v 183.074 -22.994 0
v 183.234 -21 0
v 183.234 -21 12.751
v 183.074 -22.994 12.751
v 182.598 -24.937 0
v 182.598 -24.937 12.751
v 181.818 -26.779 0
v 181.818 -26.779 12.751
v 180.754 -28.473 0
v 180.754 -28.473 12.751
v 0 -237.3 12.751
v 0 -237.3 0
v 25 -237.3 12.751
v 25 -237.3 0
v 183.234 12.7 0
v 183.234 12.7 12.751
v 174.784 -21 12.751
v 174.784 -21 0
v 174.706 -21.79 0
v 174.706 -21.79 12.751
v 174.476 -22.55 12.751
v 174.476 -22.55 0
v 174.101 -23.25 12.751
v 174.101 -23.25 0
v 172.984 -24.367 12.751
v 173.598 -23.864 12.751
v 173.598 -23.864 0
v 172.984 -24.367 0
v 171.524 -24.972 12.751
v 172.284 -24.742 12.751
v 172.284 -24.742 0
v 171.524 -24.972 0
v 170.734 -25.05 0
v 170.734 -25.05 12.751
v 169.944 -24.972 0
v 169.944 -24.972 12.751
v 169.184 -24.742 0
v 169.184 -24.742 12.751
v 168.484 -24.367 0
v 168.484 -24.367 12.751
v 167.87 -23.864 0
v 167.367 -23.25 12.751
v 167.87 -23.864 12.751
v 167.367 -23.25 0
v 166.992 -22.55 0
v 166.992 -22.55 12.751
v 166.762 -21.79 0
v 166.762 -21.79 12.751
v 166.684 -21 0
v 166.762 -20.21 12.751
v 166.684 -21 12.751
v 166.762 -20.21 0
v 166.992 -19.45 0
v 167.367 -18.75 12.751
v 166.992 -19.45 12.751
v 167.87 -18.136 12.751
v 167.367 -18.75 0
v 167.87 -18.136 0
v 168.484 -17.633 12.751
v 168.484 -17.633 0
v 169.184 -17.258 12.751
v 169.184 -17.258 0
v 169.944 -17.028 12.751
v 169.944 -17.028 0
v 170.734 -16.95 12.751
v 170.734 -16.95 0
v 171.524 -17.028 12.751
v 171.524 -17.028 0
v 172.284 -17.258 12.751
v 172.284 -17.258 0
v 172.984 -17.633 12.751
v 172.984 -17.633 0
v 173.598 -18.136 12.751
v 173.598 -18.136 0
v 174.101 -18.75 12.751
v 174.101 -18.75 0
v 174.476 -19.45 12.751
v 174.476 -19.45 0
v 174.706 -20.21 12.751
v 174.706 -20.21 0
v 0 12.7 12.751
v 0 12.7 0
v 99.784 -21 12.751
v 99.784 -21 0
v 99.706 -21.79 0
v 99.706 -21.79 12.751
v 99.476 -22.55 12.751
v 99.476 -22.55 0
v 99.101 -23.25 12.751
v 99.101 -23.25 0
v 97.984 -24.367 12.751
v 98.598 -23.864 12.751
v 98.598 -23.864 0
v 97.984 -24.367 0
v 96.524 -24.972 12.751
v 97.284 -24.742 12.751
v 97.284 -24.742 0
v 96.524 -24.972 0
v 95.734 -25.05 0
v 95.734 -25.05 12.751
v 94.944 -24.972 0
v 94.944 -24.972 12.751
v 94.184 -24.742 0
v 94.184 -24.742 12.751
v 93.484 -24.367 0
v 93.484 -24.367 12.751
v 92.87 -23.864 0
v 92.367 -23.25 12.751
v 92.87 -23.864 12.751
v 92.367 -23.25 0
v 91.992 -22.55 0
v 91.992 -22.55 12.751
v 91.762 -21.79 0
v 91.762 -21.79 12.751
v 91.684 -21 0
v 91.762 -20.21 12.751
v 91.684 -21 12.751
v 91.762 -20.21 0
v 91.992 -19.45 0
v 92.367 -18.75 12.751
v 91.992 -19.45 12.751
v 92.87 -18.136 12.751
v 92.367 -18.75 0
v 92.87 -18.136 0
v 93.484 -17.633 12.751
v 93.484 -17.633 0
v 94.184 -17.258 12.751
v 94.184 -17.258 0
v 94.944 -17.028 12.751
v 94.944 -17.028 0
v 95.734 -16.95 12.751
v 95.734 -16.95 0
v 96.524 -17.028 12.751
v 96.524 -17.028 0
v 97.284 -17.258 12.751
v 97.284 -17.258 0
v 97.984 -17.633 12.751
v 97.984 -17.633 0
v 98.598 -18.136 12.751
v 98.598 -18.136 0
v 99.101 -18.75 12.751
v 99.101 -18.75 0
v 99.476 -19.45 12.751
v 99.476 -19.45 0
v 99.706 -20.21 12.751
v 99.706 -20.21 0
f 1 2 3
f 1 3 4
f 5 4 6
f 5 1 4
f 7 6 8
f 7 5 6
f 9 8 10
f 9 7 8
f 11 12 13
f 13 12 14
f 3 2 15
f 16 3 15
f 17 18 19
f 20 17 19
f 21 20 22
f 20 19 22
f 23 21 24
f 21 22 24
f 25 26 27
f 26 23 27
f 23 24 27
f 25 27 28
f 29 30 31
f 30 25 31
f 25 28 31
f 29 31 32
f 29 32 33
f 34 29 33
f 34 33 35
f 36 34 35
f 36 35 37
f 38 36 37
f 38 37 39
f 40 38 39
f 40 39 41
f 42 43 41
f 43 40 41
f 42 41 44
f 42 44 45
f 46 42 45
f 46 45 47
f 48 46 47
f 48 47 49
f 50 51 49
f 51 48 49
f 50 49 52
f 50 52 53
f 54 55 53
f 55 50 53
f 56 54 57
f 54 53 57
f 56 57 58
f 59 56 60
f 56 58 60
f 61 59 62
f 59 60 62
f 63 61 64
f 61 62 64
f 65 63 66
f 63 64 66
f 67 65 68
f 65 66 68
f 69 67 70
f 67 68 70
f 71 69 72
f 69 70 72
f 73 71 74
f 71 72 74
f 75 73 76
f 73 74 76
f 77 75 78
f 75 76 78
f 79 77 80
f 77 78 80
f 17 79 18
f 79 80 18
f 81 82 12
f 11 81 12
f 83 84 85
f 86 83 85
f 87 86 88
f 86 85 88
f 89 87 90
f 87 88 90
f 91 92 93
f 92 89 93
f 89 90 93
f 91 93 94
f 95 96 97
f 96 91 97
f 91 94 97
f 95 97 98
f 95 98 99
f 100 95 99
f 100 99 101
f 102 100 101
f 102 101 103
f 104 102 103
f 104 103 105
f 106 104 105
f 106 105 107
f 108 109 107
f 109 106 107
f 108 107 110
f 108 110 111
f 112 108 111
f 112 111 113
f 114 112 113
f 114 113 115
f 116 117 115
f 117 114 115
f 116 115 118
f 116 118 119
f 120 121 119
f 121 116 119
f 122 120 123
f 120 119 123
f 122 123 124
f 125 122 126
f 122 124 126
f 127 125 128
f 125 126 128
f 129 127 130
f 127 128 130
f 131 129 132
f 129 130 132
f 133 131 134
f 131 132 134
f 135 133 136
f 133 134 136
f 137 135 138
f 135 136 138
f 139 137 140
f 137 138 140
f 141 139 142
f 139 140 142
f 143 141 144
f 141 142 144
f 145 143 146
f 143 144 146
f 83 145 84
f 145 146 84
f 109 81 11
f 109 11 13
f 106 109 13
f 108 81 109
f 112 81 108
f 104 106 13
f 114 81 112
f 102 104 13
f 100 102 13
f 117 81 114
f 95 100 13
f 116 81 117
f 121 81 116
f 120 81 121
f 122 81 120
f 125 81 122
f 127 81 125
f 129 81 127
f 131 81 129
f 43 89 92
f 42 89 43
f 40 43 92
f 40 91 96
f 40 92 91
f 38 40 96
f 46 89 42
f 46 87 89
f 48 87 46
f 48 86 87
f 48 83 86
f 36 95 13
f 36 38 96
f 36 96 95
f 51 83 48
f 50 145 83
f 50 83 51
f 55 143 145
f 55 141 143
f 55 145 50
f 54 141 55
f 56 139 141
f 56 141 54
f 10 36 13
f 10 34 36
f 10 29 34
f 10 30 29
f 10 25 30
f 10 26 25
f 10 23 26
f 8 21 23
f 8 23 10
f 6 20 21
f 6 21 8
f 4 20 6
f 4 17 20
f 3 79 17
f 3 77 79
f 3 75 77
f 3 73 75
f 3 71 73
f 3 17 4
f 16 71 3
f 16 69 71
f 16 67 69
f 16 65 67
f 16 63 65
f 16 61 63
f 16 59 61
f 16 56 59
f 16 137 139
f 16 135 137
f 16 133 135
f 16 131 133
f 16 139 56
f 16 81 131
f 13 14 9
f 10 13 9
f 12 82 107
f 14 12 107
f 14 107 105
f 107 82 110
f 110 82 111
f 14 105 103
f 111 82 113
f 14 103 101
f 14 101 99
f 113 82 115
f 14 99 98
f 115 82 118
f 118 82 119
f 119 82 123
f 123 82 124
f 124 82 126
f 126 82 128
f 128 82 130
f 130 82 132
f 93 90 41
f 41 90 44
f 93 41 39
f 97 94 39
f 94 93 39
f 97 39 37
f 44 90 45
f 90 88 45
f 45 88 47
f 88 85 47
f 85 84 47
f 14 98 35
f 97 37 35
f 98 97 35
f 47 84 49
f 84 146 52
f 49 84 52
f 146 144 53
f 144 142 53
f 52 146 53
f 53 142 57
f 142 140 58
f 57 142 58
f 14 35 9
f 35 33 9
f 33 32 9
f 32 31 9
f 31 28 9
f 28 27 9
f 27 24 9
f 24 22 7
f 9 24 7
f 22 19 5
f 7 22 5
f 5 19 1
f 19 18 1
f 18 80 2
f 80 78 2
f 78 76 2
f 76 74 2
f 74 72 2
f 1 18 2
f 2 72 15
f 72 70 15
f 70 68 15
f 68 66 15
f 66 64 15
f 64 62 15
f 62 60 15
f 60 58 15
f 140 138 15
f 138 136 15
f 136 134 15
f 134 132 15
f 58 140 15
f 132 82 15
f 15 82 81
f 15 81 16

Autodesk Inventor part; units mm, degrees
ref_plane "YZ Plane" through (0, 0, 0) normal (1, 0, 0) x (0, 1, 0)
ref_plane "XZ Plane" through (0, 0, 0) normal (0, 1, 0) x (-1, 0, 0)
ref_plane "XY Plane" through (0, 0, 0) normal (0, 0, 1) x (1, 0, 0)
ref_plane "Work Plane1" through (0, 0, 0) normal (0, 0, 1) x (1, 0, 0)
sketch "Sketch1" plane through (0, 0, 0) normal (0, 0, 1) x (1, 0, 0)
  circle A0 centre (95.734, -21) radius 4.05 projected
  circle A1 centre (170.734, -21) radius 4.05 projected
  line L0 (78.234, -5) -> (78.234, 0) projected
  arc A2 (83.234, -10) -> (78.234, -5) centre (78.234, -10) ccw projected
  line L1 (83.234, -10) -> (83.234, -21) projected
  arc A3 (83.234, -21) -> (108.234, -21) centre (95.734, -21) ccw projected
  line L2 (108.234, -21) -> (108.234, -10) projected
  arc A4 (113.234, -5) -> (108.234, -10) centre (113.234, -10) ccw projected
  line L3 (113.234, -5) -> (153.234, -5) projected
  arc A5 (158.234, -10) -> (153.234, -5) centre (153.234, -10) ccw projected
  line L4 (158.234, -10) -> (158.234, -21) projected
  arc A6 (158.234, -21) -> (183.234, -21) centre (170.734, -21) ccw projected
  line L5 (183.234, -21) -> (183.234, -10) projected
  arc A7 (188.234, -5) -> (183.234, -10) centre (188.234, -10) ccw projected
  line L6 (188.234, 0) -> (188.234, -5) projected
  line L7 (78.234, 0) -> (188.234, 0) projected
  line L8 (437.5, 12.7) -> (437.5, 0) projected
  line L9 (0, 12.7) -> (437.5, 12.7) projected
  line L10 (0, 0) -> (0, 12.7) projected
  line L11 (437.5, 0) -> (0, 0) projected
  line L12 (0, 12.7) -> (0, -237.3)
  line L13 (0, -237.3) -> (25, -237.3)
  line L14 (25, -237.3) -> (180.7539, -28.4734)
  line L15 (183.234, -10) -> (183.234, 12.7)
  line L16 (183.234, 12.7) -> (0, 12.7)
  dimension "d0" = 25
  dimension "d2" = 250
extrude "Extrusion1" add sketch "Sketch1" along normal blind 12.7508 contours A2 L1 A3 L2 A4 L3 A5 L4 A6 L14 L13 L12 L11 L0 | L0 L7 L15 L5 A6 L4 A5 L3 A4 L2 A3 L1 A2 | L11 L10 L9 L15 L7
properties part number "support"
